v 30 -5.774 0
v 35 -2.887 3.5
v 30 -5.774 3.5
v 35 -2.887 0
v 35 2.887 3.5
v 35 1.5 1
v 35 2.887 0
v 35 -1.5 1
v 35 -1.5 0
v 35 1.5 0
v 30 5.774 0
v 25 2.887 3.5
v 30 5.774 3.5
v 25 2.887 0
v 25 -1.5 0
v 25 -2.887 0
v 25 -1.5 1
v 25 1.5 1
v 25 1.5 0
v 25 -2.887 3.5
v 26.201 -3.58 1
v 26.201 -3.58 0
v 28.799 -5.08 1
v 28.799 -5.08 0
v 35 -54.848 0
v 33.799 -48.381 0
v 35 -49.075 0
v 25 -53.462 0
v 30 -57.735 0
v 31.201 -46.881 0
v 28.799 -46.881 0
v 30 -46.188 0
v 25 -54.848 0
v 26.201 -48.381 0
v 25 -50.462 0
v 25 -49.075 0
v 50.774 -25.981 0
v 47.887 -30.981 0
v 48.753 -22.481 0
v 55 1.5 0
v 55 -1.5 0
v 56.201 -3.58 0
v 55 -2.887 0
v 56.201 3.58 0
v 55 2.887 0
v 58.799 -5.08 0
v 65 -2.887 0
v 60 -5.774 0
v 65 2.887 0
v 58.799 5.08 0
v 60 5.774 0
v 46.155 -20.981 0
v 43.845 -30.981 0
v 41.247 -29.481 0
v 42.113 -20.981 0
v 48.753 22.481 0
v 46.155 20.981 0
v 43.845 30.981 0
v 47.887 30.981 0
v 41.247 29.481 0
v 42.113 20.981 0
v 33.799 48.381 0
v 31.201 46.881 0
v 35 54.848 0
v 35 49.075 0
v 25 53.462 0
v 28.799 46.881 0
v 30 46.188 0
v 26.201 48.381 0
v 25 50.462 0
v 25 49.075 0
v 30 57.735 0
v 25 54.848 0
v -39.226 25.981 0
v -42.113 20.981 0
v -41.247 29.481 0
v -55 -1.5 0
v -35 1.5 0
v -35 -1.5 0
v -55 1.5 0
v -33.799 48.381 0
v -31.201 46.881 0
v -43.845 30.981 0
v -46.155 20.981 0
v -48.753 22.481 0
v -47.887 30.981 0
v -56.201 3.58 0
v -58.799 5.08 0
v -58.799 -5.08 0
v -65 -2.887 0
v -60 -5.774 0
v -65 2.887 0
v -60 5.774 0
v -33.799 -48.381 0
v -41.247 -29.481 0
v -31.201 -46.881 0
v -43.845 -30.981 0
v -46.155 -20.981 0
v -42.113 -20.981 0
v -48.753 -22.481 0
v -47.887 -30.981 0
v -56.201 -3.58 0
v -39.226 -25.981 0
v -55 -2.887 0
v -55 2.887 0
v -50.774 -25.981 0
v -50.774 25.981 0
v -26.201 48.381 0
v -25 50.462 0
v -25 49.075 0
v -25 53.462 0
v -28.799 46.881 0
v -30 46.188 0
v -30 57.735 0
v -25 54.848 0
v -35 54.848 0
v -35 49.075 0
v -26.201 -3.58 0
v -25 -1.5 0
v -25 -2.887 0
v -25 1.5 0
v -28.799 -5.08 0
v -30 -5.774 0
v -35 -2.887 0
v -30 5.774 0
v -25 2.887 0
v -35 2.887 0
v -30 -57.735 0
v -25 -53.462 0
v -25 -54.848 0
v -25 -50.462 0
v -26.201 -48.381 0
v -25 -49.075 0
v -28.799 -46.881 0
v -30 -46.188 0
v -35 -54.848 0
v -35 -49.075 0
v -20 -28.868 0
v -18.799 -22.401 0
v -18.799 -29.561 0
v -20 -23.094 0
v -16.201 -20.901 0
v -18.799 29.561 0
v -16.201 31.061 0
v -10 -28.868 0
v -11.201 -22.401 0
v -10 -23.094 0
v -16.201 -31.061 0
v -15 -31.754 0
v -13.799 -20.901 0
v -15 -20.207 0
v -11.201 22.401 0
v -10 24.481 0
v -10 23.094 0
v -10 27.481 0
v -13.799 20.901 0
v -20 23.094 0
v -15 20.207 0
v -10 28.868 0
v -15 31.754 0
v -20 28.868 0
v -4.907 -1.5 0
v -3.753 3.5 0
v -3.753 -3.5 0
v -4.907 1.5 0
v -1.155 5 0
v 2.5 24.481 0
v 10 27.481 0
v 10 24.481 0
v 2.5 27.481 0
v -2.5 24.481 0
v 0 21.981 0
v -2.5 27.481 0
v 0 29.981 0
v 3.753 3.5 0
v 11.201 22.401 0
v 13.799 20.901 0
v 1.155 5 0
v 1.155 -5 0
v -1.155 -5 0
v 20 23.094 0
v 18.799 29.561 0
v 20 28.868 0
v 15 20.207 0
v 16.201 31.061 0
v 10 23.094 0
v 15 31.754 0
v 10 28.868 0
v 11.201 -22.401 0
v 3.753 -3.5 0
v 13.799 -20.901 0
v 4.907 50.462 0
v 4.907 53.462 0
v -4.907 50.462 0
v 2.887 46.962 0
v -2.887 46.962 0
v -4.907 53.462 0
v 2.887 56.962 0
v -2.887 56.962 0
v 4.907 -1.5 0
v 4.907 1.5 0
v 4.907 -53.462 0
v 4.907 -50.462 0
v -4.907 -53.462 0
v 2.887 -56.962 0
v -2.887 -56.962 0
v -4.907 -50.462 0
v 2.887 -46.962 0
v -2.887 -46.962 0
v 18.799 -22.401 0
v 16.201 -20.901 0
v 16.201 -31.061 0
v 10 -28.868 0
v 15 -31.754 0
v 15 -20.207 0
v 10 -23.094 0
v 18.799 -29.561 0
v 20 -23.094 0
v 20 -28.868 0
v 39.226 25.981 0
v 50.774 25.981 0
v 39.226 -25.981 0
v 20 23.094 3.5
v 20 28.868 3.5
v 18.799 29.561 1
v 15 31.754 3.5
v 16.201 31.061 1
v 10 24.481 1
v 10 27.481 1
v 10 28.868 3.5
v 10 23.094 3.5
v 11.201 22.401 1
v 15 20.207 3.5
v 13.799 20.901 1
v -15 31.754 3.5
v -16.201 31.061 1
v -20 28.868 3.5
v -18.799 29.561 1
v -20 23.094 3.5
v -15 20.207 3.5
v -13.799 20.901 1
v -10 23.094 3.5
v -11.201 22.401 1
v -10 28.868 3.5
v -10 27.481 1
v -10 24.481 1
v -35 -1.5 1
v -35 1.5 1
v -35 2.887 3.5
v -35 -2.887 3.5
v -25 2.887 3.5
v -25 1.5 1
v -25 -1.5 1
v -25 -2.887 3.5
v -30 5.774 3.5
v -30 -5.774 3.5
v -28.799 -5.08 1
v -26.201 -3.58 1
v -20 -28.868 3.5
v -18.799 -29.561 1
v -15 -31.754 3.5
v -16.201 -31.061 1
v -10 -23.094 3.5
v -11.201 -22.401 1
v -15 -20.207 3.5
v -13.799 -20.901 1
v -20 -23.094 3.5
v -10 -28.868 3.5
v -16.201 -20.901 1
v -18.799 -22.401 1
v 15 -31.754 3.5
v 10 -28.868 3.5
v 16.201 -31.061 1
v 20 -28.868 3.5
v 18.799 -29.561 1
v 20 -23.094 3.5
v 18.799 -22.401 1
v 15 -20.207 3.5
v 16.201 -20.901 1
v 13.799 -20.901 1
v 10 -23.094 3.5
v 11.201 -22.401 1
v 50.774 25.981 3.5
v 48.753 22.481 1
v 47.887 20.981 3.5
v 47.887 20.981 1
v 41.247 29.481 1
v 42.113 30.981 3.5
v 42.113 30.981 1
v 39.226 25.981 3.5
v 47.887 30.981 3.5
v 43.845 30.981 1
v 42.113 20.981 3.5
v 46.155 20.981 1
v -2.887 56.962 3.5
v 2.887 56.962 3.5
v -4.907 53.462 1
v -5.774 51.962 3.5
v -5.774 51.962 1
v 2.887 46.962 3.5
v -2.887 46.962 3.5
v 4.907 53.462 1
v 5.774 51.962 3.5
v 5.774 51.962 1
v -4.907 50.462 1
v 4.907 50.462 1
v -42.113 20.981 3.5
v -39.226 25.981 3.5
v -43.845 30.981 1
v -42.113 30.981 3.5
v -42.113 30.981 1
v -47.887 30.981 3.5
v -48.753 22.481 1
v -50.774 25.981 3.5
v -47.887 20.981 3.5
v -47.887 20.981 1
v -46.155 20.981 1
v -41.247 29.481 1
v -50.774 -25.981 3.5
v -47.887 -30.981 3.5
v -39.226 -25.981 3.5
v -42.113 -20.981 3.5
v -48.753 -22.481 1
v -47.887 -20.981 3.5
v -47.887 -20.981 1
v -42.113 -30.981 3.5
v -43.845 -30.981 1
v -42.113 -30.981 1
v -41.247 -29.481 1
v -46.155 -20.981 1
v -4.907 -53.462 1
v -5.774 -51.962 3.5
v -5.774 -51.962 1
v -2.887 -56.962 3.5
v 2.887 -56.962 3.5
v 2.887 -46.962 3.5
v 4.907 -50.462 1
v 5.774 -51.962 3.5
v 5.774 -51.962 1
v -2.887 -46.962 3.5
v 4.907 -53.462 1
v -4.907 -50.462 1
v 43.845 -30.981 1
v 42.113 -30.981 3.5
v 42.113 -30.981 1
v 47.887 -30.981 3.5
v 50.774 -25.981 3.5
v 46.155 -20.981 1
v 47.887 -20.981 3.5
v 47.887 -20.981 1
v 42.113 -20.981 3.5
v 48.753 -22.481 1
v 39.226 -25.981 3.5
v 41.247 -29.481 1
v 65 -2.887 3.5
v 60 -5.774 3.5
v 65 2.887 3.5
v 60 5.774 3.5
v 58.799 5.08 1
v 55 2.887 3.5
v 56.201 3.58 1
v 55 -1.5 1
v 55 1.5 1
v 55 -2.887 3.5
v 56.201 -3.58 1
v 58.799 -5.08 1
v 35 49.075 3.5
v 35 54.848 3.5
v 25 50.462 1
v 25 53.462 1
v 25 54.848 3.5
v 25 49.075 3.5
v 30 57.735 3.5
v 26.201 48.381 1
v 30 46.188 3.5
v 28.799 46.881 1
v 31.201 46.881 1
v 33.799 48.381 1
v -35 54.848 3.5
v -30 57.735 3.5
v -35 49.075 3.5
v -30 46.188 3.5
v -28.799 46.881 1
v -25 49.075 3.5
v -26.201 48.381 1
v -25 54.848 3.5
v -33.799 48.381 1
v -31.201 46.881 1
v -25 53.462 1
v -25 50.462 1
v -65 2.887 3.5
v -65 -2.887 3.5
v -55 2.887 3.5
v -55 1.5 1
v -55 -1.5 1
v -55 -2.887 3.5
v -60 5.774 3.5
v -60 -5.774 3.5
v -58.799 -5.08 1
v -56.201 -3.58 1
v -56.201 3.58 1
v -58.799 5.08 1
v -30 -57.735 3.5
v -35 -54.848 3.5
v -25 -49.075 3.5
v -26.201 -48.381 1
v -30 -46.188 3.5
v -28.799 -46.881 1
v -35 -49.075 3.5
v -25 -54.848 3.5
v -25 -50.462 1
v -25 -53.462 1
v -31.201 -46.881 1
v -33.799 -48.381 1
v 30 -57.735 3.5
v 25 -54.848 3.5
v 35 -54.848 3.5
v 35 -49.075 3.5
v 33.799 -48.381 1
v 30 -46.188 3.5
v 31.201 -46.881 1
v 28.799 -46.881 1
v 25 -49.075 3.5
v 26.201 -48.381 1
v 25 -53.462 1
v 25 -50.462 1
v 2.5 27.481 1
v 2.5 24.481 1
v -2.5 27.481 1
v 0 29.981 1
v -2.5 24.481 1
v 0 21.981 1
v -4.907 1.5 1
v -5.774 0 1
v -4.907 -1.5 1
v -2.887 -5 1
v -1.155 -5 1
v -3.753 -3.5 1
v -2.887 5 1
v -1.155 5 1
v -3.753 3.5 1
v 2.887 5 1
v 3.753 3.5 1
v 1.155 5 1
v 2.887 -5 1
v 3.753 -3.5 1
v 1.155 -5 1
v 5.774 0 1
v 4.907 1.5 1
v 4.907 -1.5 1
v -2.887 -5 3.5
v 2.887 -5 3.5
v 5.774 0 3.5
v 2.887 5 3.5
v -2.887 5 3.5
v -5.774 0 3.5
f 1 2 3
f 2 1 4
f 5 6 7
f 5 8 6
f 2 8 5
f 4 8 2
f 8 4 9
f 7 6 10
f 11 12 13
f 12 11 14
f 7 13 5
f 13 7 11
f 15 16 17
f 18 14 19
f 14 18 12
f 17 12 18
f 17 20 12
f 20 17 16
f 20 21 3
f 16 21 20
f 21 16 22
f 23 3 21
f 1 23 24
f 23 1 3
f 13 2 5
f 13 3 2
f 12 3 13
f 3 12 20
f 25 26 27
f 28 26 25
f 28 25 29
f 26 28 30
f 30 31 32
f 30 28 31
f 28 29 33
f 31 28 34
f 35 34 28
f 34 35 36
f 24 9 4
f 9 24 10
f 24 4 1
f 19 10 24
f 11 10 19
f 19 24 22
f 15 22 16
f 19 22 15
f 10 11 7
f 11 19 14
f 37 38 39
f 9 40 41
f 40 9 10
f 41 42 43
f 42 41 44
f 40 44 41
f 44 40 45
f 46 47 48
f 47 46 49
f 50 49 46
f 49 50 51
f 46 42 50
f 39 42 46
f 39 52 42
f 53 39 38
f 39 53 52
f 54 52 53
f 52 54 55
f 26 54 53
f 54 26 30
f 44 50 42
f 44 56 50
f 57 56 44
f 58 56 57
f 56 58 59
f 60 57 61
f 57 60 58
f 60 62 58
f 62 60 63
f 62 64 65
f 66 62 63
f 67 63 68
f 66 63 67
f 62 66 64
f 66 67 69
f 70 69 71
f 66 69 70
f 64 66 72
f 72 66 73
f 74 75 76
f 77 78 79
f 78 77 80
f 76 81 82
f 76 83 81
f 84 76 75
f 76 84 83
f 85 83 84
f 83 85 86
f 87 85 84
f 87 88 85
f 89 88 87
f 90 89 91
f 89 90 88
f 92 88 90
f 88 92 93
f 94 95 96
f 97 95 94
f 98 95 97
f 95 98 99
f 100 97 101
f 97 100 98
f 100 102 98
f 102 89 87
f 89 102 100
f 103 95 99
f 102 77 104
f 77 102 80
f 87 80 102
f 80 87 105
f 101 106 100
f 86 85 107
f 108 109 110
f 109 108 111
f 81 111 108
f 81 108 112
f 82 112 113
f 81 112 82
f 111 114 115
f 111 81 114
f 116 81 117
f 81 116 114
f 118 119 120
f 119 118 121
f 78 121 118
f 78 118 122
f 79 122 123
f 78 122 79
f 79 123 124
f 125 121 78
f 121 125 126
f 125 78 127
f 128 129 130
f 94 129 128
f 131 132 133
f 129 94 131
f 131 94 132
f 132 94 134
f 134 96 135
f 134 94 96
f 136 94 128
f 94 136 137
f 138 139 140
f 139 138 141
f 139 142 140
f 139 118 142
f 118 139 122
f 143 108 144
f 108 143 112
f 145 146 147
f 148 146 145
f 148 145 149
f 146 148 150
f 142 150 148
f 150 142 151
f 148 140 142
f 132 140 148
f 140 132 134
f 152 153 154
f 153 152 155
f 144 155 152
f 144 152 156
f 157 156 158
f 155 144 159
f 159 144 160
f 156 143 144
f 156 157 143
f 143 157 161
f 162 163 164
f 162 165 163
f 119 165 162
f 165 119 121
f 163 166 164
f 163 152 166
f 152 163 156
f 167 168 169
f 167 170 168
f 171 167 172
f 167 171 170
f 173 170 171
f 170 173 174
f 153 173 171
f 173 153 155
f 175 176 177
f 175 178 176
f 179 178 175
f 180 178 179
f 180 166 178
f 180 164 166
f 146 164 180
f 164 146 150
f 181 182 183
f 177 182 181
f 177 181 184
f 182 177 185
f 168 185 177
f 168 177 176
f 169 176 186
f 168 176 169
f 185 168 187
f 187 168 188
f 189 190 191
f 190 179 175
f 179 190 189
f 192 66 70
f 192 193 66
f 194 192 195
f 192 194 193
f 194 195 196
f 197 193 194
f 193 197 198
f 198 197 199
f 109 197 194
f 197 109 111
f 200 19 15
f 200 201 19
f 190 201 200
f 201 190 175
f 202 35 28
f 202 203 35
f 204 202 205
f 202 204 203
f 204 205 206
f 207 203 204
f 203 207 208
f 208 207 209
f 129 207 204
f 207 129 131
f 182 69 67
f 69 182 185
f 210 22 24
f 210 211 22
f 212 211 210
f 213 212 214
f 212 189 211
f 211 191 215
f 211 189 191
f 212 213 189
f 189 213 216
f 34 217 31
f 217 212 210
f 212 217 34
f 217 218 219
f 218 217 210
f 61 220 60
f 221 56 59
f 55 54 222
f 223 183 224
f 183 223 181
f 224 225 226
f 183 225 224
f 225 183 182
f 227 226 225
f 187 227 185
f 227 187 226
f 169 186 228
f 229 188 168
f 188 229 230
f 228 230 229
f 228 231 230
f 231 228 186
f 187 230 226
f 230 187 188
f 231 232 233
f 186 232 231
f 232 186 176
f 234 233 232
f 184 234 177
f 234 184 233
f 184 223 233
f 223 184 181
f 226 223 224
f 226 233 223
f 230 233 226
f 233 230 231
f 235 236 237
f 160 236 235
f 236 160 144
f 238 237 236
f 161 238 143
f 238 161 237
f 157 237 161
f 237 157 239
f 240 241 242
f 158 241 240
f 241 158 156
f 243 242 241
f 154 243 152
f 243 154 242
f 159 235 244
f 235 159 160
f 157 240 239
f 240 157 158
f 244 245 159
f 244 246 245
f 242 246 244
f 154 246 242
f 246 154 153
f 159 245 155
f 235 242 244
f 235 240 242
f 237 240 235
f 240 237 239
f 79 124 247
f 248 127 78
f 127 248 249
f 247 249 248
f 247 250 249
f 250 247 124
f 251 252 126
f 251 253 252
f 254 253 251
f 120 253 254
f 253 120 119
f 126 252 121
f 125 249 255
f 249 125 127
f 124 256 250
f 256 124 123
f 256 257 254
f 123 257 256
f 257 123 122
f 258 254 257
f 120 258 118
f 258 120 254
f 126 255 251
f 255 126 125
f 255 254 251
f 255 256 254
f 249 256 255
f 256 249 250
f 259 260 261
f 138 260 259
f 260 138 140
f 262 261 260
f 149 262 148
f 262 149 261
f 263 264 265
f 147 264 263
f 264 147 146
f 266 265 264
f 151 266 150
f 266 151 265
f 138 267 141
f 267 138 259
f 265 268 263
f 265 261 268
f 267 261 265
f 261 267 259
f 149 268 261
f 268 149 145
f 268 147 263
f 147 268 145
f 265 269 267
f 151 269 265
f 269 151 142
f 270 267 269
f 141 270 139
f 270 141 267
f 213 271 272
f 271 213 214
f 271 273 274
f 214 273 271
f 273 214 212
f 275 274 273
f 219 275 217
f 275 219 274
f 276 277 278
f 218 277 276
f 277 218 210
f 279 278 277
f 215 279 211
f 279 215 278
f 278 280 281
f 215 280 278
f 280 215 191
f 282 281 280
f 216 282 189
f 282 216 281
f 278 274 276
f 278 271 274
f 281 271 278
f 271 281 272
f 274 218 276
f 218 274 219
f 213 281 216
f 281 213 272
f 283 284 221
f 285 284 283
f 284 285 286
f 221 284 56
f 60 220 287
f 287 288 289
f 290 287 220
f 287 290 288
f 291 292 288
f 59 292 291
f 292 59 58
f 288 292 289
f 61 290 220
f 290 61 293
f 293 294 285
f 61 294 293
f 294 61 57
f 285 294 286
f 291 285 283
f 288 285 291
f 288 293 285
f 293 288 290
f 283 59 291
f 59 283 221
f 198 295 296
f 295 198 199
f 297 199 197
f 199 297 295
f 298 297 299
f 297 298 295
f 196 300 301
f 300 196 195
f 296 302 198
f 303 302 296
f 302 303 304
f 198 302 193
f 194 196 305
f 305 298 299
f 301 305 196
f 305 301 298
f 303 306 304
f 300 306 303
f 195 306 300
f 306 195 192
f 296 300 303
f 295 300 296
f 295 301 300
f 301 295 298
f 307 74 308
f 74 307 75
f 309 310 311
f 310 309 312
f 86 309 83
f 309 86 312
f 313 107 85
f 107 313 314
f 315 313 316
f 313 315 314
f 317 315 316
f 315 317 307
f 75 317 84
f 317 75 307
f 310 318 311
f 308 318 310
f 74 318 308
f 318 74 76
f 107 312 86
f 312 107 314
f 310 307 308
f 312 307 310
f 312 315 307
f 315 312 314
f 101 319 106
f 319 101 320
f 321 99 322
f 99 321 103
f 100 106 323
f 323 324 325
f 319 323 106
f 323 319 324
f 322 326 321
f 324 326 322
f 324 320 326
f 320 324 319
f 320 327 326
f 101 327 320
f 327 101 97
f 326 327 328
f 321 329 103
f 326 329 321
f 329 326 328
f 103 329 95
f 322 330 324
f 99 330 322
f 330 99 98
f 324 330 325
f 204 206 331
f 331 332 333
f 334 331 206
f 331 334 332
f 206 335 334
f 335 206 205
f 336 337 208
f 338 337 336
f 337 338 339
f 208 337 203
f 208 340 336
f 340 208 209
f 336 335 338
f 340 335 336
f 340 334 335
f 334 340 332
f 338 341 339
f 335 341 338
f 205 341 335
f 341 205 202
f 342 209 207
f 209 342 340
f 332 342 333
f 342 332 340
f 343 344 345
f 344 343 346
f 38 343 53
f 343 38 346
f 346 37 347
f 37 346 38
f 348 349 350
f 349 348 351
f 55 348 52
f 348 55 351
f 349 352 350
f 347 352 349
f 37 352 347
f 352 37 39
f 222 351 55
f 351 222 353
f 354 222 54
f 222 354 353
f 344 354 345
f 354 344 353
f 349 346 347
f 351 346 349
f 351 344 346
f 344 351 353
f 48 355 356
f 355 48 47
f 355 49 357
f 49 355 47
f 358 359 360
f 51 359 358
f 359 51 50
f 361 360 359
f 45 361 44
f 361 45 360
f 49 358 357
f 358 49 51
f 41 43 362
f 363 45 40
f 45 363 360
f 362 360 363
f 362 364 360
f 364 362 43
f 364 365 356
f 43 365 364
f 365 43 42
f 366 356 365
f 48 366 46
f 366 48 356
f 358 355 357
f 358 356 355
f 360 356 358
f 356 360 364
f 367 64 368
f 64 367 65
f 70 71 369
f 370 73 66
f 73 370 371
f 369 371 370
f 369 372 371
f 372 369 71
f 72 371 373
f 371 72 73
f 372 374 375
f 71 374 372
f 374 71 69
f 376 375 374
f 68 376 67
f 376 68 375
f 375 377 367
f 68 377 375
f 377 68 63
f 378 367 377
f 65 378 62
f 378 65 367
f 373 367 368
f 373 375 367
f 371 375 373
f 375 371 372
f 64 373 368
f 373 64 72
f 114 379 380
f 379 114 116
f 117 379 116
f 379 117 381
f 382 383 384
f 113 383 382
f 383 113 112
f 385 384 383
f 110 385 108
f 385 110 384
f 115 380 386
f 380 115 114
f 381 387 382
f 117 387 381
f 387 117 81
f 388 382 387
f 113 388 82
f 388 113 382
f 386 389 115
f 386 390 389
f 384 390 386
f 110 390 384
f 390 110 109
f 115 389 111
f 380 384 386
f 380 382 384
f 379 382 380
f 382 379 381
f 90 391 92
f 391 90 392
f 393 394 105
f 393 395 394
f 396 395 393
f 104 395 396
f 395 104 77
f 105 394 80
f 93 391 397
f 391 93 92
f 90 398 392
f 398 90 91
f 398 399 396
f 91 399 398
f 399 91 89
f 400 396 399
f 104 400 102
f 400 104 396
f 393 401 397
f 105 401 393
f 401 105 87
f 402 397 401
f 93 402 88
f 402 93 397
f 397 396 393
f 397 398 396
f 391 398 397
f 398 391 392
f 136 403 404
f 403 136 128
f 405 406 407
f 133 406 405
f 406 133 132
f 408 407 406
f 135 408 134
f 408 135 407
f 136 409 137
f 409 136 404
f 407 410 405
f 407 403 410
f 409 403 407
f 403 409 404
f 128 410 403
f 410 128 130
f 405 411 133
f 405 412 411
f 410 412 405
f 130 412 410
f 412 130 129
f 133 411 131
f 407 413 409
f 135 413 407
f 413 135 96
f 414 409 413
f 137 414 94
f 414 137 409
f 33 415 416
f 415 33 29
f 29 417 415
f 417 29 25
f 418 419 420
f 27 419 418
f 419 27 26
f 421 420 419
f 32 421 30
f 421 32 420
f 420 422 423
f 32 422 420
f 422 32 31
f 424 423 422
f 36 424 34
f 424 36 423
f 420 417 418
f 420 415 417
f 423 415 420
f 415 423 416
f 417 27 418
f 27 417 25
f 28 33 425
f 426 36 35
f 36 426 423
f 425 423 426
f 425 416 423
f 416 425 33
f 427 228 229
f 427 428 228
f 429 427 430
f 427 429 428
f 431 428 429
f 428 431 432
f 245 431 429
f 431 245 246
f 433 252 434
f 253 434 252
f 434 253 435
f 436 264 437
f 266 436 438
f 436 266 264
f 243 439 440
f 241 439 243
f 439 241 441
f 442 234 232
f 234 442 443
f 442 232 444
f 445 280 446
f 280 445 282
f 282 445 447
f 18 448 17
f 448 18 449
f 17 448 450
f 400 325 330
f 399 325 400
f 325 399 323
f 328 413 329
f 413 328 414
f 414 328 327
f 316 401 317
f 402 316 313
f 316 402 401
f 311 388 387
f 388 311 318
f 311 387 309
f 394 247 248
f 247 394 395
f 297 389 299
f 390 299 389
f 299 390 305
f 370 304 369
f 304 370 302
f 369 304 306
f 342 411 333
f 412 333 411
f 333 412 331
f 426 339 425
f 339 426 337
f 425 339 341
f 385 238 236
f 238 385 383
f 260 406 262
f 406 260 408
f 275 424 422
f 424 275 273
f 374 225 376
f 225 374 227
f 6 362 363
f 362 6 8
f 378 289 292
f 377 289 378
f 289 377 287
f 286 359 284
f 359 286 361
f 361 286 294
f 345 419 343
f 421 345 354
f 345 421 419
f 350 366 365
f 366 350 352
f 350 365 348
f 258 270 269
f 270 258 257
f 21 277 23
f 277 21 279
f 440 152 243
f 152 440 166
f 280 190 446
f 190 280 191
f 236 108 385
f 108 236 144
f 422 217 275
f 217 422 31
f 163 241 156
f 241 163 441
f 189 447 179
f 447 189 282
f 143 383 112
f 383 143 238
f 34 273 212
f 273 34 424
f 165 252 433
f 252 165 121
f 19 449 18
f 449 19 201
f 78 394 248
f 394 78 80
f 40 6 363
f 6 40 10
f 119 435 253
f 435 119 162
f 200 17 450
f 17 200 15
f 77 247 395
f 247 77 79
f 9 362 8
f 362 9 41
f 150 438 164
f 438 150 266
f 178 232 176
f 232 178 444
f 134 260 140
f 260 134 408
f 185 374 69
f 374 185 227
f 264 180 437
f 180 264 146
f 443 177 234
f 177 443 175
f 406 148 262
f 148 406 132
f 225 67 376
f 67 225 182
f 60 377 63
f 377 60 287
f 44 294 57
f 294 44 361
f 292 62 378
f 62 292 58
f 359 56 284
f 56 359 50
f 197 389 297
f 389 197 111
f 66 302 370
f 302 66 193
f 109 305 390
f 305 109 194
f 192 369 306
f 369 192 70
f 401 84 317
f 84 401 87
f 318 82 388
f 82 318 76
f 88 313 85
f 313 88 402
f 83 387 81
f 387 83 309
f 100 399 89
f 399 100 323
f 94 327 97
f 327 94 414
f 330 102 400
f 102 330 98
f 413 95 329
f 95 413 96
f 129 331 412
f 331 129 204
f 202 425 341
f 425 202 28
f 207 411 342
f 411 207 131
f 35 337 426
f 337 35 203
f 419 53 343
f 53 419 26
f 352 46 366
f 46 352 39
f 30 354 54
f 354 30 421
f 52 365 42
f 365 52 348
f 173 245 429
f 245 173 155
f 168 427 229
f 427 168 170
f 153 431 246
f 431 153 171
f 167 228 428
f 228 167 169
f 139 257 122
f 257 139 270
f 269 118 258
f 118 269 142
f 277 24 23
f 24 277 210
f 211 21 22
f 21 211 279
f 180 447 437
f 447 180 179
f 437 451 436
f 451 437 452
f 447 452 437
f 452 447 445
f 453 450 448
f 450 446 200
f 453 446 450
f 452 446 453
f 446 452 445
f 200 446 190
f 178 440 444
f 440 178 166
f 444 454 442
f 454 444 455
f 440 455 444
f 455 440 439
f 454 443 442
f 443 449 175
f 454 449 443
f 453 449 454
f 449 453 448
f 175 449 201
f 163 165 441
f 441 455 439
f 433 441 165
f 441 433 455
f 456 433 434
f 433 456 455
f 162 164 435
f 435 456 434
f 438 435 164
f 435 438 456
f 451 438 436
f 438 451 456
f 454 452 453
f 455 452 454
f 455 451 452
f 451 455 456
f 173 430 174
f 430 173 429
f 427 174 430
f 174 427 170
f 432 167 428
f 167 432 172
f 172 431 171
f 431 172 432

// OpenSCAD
// calibration pattern B?
hr=5/cos(30);
spc=30;

spcX=spc/2;
spcY=spc*sin(60);

module marker(rot=0) { rotate([0,0,rot?30:0]) cylinder(r=hr,h=3.5,$fn=6); }

module calGrid() {
  marker(0);
  for (a=[ 0:60:359]) rotate([0,0,a]) translate([  spc ,0,0]) marker(1);
  for (a=[30:60:359]) rotate([0,0,a]) translate([2*spcY,0,0]) marker(1);
  for (a=[ 0:60:359]) rotate([0,0,a]) translate([2*spc ,0,0]) marker(1);
  %for (a=[ 0:60:359]) rotate([0,0,a]) translate([3*spc ,0,0]) marker(1);

  #for (a=[-60:60:66]) rotate([0,0,a])
    translate([0,0,.5]) cube([4*spc,3,1],center=true);

  for (a=[30:60:359]) rotate([0,0,a])
    translate([2*spcY,0,.5]) cube([3,2*spc,1],center=true);

  for (a=[0:120:355]) rotate([0,0,a])
    translate([0,spcY,.5]) cube([spc,3,1],center=true);

  translate([0,spcY,0]) cylinder(r=4,h=1,$fn=4); // fiducial for +y direction

  // These are all radius 2.64575131106459*spc
  for (a=[-1,1]) for (b=[-1,1])
    %translate([2.5*spc*a,spcY*b,0]) marker(0);

  for (a=[-1,1]) for (b=[-1,1])
    %translate([2*spc*a,2*spcY*b,0]) marker(0);

  for (a=[-1,1]) for (b=[-1,1])
    %translate([0.5*spc*a,3*spcY*b,0]) marker(0);
}

%translate([0,0,-1]) cylinder(r=70/cos(30),h=1,$fn=60);

//projection(cut=true) translate([0,0,-0.1])
  calGrid();
